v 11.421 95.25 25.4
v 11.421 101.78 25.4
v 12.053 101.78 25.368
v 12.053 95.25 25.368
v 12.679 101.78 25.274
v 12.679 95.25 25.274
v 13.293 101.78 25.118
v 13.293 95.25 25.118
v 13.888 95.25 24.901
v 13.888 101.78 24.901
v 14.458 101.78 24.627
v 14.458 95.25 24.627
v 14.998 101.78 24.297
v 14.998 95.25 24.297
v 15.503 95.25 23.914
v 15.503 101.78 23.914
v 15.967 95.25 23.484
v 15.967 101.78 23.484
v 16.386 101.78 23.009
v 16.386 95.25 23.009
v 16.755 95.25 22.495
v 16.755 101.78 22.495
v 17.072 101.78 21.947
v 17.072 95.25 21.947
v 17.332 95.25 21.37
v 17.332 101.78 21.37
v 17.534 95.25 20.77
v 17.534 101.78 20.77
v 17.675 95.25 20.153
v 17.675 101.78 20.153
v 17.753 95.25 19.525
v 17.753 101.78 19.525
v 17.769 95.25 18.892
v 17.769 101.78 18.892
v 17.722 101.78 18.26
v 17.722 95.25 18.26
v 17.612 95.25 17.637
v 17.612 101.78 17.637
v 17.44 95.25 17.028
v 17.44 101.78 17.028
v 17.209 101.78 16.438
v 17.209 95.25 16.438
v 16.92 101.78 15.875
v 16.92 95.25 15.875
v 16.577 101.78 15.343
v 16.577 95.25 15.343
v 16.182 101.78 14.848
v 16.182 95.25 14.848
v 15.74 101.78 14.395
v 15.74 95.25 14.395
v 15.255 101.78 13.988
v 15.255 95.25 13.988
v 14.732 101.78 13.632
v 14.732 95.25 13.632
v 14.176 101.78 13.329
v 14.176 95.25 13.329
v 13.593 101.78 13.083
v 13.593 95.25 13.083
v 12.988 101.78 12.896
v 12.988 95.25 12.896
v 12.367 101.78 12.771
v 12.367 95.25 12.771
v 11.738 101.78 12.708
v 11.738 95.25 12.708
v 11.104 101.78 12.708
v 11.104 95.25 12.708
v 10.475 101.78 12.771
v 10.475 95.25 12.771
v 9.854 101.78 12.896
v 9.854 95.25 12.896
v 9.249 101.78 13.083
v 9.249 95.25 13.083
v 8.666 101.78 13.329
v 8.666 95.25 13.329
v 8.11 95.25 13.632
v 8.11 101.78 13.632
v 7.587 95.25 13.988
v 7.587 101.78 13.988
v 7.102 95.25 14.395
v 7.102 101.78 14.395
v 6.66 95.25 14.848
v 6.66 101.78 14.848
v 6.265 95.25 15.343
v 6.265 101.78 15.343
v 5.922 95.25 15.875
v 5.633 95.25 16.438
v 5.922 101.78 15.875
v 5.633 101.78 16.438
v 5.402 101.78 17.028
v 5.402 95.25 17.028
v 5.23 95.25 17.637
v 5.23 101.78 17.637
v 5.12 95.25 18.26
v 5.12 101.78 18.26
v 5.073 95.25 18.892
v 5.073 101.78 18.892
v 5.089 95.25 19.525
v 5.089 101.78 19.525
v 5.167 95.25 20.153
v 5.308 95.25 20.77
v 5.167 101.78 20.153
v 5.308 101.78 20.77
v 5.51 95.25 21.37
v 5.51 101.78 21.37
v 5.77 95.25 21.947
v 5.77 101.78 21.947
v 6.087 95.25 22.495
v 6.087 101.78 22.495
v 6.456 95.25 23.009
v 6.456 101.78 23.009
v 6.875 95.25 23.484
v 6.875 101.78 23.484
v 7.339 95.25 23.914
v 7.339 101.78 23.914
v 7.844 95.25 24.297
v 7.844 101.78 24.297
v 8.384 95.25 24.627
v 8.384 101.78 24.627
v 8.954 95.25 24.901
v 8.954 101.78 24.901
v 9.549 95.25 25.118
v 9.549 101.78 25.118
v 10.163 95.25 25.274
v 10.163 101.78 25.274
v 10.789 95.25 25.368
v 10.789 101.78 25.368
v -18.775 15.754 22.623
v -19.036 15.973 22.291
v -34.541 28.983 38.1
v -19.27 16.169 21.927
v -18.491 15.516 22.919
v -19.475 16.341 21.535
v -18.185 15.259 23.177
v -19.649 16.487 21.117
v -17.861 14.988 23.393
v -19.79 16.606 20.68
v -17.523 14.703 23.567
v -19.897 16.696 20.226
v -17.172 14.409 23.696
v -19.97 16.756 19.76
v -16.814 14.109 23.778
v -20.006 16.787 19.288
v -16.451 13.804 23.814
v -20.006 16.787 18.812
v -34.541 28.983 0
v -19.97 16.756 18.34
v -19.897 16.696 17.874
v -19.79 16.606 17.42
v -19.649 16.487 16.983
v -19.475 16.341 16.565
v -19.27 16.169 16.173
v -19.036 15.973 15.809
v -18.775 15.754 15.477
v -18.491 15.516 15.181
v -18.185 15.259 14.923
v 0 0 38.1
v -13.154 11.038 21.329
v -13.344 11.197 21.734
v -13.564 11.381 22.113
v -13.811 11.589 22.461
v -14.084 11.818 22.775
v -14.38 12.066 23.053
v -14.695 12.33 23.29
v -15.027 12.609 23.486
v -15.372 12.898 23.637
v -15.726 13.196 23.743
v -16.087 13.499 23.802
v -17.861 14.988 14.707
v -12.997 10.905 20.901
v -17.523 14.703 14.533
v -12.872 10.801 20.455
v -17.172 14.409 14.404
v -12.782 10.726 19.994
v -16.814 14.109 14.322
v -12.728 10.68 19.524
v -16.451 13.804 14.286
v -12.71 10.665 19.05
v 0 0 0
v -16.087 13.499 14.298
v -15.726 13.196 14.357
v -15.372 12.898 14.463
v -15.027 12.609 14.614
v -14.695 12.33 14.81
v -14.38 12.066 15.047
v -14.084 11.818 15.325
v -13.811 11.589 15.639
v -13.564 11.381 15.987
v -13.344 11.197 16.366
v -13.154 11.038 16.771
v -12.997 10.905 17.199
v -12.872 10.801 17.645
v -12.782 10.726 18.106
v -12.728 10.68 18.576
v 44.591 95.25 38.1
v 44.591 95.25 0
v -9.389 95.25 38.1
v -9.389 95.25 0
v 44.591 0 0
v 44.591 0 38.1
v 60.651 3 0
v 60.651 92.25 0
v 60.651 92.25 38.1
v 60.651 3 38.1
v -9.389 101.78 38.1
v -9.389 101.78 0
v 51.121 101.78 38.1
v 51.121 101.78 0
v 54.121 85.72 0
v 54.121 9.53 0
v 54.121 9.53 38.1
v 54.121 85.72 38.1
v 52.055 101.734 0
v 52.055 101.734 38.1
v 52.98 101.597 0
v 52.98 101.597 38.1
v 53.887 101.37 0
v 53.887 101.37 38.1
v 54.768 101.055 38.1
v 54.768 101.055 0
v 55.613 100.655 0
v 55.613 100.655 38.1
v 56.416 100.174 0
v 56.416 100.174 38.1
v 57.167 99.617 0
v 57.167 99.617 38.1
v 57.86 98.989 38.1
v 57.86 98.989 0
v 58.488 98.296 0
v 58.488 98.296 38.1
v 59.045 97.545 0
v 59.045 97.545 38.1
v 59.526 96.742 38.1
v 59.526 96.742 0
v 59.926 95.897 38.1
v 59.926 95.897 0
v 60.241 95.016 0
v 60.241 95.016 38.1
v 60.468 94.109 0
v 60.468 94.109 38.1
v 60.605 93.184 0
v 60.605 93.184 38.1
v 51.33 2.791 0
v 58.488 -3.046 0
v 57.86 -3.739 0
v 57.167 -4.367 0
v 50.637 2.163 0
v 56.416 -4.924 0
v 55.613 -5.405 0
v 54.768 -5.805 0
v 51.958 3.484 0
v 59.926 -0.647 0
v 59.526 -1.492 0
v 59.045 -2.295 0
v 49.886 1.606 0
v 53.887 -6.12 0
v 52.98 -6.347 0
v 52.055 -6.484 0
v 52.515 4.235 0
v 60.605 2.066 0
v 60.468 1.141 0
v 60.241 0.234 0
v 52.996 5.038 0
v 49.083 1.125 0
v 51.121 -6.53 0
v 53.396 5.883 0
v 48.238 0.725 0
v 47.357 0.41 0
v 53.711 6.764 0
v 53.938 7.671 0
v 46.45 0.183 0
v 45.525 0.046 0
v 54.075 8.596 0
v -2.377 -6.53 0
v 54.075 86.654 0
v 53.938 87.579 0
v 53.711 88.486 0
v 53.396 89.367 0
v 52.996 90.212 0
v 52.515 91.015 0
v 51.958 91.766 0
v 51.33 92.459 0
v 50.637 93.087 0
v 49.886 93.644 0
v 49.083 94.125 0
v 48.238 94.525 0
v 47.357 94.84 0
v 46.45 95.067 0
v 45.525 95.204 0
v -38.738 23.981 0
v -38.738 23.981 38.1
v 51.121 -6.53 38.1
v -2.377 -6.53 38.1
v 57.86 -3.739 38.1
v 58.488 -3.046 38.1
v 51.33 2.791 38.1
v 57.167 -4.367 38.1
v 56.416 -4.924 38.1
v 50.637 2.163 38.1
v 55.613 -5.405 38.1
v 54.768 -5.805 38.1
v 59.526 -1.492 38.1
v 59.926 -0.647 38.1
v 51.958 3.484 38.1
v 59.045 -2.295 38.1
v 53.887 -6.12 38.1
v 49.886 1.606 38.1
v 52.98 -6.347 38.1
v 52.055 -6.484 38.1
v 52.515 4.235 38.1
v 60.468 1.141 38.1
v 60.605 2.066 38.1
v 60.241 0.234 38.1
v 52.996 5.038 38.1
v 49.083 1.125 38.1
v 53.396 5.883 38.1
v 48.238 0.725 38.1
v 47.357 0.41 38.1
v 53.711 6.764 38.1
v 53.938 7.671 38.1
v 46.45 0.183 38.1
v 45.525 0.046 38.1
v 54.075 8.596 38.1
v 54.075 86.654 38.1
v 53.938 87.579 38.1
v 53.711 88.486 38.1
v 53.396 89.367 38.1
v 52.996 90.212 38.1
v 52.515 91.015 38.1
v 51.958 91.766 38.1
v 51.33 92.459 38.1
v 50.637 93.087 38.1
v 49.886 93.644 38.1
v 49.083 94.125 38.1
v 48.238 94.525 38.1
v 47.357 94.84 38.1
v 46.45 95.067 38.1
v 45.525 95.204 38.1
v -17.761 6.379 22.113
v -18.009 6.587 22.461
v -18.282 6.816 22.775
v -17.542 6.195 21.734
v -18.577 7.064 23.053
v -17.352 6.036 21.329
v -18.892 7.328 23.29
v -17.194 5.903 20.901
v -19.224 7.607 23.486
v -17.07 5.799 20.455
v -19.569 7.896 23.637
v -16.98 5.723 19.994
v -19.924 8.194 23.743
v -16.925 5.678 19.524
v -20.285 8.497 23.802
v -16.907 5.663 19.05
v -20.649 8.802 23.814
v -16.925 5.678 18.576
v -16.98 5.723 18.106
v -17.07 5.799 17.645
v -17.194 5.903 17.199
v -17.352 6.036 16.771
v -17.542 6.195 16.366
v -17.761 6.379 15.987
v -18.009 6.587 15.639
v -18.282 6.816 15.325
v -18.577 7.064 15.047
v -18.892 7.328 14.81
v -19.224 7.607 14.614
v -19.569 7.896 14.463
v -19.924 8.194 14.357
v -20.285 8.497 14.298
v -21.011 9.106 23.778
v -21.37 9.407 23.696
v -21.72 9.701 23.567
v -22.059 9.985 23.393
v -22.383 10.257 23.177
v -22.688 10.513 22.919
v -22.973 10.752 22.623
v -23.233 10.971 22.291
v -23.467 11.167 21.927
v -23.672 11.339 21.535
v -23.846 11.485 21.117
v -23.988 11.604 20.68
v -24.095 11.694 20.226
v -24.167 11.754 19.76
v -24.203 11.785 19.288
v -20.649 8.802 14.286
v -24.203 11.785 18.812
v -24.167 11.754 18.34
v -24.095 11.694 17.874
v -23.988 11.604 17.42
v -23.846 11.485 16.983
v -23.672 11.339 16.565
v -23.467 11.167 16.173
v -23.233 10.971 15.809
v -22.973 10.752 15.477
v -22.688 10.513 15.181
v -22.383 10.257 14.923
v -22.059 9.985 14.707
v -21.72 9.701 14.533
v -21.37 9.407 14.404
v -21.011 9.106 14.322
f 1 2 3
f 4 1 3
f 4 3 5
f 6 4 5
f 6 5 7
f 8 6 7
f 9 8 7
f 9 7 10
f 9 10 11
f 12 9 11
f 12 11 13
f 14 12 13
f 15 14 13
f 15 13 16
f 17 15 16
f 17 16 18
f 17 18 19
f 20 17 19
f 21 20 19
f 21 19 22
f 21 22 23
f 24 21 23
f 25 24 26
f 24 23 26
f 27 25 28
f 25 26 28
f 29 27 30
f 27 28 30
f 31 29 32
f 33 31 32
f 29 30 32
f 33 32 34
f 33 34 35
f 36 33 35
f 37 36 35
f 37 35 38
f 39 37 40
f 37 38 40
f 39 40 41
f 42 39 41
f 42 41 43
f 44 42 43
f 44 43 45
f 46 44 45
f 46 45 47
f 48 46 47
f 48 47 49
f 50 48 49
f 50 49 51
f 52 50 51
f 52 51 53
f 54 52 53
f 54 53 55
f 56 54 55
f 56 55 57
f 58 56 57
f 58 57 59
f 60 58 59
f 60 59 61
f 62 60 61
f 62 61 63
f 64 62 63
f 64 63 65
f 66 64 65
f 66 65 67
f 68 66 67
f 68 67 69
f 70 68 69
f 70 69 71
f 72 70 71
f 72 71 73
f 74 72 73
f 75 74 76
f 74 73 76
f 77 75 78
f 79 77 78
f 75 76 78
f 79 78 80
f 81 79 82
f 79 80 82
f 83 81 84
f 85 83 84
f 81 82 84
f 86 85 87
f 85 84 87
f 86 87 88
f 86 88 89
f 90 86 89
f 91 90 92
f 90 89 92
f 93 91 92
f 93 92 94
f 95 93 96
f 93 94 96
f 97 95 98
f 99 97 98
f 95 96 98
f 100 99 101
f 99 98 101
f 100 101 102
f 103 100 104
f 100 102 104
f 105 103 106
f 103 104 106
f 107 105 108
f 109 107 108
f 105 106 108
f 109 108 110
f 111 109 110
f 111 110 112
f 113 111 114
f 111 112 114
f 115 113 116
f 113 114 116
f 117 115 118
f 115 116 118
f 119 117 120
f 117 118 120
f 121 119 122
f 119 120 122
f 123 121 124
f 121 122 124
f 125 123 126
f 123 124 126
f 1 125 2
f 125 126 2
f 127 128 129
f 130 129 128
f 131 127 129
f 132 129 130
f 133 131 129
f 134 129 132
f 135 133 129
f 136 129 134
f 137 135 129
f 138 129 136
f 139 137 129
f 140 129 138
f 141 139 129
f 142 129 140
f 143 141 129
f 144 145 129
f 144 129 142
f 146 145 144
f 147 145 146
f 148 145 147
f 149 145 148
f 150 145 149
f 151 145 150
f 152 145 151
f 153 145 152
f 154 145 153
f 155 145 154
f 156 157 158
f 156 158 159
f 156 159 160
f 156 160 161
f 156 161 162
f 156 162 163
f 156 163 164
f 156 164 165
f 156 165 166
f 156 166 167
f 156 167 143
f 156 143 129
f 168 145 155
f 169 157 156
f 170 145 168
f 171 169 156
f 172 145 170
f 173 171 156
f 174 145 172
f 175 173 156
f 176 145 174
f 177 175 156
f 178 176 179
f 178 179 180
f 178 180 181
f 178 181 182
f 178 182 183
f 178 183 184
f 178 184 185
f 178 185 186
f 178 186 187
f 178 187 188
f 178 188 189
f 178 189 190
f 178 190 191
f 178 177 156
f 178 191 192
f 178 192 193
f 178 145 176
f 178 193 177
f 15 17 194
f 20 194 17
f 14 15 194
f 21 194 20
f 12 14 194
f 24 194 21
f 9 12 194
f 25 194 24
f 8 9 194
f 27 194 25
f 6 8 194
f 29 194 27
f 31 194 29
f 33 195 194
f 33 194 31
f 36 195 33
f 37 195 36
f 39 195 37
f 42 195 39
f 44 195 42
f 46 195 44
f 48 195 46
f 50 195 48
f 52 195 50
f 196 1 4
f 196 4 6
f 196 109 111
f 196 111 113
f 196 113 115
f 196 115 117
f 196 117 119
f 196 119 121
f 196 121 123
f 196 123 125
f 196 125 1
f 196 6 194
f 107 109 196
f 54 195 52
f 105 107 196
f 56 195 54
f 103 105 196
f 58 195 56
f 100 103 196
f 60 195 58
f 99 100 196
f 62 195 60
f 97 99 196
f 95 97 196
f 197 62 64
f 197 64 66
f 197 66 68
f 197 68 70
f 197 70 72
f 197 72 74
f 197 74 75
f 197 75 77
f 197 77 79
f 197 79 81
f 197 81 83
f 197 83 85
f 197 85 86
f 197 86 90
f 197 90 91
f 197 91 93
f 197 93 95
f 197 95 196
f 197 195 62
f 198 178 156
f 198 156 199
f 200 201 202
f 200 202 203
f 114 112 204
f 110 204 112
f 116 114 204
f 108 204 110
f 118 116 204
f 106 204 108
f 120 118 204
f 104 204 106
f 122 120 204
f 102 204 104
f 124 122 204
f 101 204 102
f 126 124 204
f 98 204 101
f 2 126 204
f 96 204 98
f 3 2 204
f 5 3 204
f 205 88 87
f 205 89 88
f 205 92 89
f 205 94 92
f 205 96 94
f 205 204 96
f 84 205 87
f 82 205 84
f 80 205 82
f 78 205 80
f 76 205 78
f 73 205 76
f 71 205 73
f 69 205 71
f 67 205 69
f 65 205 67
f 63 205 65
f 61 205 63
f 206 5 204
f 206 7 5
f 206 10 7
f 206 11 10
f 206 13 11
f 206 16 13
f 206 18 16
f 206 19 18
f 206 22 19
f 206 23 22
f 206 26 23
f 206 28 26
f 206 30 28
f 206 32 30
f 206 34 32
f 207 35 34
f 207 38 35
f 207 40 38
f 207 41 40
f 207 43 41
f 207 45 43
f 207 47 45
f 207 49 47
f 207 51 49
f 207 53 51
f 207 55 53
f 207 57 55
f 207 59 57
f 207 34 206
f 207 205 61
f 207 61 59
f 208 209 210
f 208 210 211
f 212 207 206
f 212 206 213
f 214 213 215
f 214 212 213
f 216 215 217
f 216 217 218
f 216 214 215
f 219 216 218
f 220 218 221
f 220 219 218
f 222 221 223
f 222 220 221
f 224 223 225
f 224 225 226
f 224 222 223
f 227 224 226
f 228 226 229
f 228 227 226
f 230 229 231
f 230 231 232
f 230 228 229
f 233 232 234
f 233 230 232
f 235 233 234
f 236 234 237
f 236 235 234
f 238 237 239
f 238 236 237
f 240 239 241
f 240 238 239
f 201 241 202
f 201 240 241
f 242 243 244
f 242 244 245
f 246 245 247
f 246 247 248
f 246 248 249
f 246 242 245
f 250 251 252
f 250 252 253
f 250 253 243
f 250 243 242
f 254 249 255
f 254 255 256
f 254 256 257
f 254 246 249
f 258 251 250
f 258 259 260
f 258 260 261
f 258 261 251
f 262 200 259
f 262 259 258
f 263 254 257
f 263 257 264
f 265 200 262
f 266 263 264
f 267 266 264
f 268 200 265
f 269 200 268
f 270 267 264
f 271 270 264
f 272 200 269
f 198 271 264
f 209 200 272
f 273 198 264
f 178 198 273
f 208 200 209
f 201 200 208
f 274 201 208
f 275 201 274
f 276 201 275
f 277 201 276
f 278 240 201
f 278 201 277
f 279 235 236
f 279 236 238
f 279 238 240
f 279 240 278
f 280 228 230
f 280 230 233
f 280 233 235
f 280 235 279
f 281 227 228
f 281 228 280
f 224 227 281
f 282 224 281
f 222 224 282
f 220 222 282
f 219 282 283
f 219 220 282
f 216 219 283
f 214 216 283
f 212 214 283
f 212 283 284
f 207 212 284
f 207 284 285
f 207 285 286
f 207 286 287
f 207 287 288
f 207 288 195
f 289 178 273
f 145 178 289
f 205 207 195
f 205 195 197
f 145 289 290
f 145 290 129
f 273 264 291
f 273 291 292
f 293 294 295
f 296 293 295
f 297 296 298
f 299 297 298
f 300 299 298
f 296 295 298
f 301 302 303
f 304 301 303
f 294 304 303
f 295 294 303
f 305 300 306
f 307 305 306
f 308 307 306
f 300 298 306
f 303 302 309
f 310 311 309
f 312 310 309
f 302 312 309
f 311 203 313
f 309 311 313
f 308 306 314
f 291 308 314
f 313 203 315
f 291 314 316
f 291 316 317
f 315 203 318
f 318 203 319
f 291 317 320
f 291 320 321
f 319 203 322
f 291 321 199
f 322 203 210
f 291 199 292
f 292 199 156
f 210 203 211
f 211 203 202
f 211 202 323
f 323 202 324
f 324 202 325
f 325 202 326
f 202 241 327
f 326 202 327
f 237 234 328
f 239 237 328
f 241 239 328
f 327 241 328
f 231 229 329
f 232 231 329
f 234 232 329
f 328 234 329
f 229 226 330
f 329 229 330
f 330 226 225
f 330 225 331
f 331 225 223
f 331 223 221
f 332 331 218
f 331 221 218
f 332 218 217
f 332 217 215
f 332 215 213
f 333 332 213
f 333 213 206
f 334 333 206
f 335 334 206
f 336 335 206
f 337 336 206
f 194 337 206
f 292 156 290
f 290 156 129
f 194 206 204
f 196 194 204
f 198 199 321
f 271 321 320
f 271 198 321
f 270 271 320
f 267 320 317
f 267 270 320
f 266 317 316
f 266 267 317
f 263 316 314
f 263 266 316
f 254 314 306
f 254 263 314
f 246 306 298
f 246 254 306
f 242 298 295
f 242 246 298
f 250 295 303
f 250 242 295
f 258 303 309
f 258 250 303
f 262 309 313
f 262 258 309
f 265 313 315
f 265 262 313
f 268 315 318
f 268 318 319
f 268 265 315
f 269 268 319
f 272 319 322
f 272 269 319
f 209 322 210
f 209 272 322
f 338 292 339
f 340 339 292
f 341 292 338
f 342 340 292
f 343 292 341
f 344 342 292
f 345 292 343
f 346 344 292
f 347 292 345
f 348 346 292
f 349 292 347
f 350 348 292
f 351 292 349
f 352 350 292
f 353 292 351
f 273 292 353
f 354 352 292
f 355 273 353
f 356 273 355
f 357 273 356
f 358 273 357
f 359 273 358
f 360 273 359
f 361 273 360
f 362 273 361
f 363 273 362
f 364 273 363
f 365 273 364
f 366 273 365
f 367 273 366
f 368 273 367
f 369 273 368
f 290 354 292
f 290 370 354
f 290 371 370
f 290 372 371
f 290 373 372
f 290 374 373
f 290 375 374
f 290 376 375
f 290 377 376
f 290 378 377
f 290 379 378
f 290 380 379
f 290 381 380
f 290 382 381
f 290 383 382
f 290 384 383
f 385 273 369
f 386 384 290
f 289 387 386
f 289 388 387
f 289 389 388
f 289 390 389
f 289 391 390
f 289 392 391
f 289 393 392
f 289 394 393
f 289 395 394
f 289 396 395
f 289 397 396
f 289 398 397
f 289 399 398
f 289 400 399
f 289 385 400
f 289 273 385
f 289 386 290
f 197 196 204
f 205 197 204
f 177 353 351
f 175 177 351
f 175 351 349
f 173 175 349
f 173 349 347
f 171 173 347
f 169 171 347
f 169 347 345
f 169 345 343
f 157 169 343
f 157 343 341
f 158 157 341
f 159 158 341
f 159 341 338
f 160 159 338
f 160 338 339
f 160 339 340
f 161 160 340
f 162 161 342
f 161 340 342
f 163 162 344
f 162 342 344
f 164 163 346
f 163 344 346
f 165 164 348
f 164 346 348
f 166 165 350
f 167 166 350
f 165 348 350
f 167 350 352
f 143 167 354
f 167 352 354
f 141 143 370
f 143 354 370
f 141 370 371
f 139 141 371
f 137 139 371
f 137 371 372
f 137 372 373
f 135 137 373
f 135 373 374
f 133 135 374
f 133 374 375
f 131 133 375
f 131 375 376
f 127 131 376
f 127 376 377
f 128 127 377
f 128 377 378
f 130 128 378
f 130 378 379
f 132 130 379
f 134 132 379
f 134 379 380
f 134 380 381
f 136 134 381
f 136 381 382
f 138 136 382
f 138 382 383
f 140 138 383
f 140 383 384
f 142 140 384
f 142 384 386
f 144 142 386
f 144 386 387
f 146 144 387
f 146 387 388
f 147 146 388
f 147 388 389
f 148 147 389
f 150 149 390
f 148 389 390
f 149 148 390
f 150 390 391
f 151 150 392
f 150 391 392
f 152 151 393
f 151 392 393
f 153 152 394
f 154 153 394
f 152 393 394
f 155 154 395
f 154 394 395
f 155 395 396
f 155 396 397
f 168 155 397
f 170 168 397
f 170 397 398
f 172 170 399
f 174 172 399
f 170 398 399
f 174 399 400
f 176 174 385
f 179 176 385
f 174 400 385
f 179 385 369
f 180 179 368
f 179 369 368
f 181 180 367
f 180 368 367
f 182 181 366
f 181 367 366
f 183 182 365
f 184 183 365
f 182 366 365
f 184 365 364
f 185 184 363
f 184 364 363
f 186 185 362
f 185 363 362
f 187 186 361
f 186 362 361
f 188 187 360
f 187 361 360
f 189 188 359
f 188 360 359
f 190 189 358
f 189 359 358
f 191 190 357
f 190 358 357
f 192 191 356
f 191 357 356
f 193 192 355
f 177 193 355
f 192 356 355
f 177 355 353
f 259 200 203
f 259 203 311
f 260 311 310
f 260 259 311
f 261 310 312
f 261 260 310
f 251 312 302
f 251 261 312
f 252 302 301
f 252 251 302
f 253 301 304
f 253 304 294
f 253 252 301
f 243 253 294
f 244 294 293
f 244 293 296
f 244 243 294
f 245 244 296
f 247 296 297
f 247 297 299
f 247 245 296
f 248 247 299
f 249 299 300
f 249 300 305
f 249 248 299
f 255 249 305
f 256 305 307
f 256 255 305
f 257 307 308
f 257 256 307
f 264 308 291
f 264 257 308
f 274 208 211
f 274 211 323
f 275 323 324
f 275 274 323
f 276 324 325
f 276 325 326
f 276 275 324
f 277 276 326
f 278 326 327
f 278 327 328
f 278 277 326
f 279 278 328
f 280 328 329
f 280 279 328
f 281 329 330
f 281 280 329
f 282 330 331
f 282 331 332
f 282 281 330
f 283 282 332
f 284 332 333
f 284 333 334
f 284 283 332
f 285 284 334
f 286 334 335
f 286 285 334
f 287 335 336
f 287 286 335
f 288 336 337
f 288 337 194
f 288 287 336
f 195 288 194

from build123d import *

# Parameters (mm, degrees)
BOSS_EXTRUDE1_DEPTH = 38.1
SKETCH2_R           = 6.35
CUT_EXTRUDE1_DEPTH  = 86.1
SKETCH4_R           = 4.765
CUT_EXTRUDE2_DEPTH  = 9.1


with BuildPart() as part:
    # Sketch1 → Boss-Extrude1 (new body)
    with BuildSketch(Plane.XY):
        with BuildLine():
            Line((0, 0), (44.591, 0))
            ThreePointArc((44.591, 0), (51.329727625, 2.791272375), (54.121, 9.53))
            Line((54.121, 9.53), (54.121, 85.72))
            ThreePointArc((54.121, 85.72), (51.329727625, 92.458727625), (44.591, 95.25))
            Line((44.591, 95.25), (-9.389, 95.25))
            Line((-9.389, 95.25), (-9.389, 101.78))
            Line((-9.389, 101.78), (51.121, 101.78))
            ThreePointArc((51.121, 101.78), (57.859727625, 98.988727625), (60.651, 92.25))
            Line((60.651, 92.25), (60.651, 3))
            ThreePointArc((60.651, 3), (57.859727625, -3.738727625), (51.121, -6.53))
            Line((51.121, -6.53), (-2.37672563, -6.53))
            Line((-2.37672563, -6.53), (-38.738347031, 23.981023107))
            Line((-38.738347031, 23.981023107), (-34.54094394, 28.983293321))
            Line((-34.54094394, 28.983293321), (0, 0))
        make_face()
    extrude(amount=BOSS_EXTRUDE1_DEPTH)

    # Sketch2 → Cut-Extrude1 (cut)
    with BuildSketch(Plane(origin=(0, 101.78, 0), x_dir=(1, 0, 0), z_dir=(0, 1, 0))):
        with Locations(Location((11.421, -19.05, 0), (0, 0, 270))):
            Circle(SKETCH2_R)
    extrude(amount=-CUT_EXTRUDE1_DEPTH, mode=Mode.SUBTRACT)

    # Sketch4 → Cut-Extrude2 (cut)
    with BuildSketch(Plane(origin=(-4.197403091, -5.002270214, 0), x_dir=(0.7660444431189817, -0.642787609686535, 0), z_dir=(-0.642787609686535, -0.7660444431189818, 0))):
        with Locations((-21.356637185, 19.05)):
            Circle(SKETCH4_R)
    extrude(amount=-CUT_EXTRUDE2_DEPTH, mode=Mode.SUBTRACT)


solid = part.part
